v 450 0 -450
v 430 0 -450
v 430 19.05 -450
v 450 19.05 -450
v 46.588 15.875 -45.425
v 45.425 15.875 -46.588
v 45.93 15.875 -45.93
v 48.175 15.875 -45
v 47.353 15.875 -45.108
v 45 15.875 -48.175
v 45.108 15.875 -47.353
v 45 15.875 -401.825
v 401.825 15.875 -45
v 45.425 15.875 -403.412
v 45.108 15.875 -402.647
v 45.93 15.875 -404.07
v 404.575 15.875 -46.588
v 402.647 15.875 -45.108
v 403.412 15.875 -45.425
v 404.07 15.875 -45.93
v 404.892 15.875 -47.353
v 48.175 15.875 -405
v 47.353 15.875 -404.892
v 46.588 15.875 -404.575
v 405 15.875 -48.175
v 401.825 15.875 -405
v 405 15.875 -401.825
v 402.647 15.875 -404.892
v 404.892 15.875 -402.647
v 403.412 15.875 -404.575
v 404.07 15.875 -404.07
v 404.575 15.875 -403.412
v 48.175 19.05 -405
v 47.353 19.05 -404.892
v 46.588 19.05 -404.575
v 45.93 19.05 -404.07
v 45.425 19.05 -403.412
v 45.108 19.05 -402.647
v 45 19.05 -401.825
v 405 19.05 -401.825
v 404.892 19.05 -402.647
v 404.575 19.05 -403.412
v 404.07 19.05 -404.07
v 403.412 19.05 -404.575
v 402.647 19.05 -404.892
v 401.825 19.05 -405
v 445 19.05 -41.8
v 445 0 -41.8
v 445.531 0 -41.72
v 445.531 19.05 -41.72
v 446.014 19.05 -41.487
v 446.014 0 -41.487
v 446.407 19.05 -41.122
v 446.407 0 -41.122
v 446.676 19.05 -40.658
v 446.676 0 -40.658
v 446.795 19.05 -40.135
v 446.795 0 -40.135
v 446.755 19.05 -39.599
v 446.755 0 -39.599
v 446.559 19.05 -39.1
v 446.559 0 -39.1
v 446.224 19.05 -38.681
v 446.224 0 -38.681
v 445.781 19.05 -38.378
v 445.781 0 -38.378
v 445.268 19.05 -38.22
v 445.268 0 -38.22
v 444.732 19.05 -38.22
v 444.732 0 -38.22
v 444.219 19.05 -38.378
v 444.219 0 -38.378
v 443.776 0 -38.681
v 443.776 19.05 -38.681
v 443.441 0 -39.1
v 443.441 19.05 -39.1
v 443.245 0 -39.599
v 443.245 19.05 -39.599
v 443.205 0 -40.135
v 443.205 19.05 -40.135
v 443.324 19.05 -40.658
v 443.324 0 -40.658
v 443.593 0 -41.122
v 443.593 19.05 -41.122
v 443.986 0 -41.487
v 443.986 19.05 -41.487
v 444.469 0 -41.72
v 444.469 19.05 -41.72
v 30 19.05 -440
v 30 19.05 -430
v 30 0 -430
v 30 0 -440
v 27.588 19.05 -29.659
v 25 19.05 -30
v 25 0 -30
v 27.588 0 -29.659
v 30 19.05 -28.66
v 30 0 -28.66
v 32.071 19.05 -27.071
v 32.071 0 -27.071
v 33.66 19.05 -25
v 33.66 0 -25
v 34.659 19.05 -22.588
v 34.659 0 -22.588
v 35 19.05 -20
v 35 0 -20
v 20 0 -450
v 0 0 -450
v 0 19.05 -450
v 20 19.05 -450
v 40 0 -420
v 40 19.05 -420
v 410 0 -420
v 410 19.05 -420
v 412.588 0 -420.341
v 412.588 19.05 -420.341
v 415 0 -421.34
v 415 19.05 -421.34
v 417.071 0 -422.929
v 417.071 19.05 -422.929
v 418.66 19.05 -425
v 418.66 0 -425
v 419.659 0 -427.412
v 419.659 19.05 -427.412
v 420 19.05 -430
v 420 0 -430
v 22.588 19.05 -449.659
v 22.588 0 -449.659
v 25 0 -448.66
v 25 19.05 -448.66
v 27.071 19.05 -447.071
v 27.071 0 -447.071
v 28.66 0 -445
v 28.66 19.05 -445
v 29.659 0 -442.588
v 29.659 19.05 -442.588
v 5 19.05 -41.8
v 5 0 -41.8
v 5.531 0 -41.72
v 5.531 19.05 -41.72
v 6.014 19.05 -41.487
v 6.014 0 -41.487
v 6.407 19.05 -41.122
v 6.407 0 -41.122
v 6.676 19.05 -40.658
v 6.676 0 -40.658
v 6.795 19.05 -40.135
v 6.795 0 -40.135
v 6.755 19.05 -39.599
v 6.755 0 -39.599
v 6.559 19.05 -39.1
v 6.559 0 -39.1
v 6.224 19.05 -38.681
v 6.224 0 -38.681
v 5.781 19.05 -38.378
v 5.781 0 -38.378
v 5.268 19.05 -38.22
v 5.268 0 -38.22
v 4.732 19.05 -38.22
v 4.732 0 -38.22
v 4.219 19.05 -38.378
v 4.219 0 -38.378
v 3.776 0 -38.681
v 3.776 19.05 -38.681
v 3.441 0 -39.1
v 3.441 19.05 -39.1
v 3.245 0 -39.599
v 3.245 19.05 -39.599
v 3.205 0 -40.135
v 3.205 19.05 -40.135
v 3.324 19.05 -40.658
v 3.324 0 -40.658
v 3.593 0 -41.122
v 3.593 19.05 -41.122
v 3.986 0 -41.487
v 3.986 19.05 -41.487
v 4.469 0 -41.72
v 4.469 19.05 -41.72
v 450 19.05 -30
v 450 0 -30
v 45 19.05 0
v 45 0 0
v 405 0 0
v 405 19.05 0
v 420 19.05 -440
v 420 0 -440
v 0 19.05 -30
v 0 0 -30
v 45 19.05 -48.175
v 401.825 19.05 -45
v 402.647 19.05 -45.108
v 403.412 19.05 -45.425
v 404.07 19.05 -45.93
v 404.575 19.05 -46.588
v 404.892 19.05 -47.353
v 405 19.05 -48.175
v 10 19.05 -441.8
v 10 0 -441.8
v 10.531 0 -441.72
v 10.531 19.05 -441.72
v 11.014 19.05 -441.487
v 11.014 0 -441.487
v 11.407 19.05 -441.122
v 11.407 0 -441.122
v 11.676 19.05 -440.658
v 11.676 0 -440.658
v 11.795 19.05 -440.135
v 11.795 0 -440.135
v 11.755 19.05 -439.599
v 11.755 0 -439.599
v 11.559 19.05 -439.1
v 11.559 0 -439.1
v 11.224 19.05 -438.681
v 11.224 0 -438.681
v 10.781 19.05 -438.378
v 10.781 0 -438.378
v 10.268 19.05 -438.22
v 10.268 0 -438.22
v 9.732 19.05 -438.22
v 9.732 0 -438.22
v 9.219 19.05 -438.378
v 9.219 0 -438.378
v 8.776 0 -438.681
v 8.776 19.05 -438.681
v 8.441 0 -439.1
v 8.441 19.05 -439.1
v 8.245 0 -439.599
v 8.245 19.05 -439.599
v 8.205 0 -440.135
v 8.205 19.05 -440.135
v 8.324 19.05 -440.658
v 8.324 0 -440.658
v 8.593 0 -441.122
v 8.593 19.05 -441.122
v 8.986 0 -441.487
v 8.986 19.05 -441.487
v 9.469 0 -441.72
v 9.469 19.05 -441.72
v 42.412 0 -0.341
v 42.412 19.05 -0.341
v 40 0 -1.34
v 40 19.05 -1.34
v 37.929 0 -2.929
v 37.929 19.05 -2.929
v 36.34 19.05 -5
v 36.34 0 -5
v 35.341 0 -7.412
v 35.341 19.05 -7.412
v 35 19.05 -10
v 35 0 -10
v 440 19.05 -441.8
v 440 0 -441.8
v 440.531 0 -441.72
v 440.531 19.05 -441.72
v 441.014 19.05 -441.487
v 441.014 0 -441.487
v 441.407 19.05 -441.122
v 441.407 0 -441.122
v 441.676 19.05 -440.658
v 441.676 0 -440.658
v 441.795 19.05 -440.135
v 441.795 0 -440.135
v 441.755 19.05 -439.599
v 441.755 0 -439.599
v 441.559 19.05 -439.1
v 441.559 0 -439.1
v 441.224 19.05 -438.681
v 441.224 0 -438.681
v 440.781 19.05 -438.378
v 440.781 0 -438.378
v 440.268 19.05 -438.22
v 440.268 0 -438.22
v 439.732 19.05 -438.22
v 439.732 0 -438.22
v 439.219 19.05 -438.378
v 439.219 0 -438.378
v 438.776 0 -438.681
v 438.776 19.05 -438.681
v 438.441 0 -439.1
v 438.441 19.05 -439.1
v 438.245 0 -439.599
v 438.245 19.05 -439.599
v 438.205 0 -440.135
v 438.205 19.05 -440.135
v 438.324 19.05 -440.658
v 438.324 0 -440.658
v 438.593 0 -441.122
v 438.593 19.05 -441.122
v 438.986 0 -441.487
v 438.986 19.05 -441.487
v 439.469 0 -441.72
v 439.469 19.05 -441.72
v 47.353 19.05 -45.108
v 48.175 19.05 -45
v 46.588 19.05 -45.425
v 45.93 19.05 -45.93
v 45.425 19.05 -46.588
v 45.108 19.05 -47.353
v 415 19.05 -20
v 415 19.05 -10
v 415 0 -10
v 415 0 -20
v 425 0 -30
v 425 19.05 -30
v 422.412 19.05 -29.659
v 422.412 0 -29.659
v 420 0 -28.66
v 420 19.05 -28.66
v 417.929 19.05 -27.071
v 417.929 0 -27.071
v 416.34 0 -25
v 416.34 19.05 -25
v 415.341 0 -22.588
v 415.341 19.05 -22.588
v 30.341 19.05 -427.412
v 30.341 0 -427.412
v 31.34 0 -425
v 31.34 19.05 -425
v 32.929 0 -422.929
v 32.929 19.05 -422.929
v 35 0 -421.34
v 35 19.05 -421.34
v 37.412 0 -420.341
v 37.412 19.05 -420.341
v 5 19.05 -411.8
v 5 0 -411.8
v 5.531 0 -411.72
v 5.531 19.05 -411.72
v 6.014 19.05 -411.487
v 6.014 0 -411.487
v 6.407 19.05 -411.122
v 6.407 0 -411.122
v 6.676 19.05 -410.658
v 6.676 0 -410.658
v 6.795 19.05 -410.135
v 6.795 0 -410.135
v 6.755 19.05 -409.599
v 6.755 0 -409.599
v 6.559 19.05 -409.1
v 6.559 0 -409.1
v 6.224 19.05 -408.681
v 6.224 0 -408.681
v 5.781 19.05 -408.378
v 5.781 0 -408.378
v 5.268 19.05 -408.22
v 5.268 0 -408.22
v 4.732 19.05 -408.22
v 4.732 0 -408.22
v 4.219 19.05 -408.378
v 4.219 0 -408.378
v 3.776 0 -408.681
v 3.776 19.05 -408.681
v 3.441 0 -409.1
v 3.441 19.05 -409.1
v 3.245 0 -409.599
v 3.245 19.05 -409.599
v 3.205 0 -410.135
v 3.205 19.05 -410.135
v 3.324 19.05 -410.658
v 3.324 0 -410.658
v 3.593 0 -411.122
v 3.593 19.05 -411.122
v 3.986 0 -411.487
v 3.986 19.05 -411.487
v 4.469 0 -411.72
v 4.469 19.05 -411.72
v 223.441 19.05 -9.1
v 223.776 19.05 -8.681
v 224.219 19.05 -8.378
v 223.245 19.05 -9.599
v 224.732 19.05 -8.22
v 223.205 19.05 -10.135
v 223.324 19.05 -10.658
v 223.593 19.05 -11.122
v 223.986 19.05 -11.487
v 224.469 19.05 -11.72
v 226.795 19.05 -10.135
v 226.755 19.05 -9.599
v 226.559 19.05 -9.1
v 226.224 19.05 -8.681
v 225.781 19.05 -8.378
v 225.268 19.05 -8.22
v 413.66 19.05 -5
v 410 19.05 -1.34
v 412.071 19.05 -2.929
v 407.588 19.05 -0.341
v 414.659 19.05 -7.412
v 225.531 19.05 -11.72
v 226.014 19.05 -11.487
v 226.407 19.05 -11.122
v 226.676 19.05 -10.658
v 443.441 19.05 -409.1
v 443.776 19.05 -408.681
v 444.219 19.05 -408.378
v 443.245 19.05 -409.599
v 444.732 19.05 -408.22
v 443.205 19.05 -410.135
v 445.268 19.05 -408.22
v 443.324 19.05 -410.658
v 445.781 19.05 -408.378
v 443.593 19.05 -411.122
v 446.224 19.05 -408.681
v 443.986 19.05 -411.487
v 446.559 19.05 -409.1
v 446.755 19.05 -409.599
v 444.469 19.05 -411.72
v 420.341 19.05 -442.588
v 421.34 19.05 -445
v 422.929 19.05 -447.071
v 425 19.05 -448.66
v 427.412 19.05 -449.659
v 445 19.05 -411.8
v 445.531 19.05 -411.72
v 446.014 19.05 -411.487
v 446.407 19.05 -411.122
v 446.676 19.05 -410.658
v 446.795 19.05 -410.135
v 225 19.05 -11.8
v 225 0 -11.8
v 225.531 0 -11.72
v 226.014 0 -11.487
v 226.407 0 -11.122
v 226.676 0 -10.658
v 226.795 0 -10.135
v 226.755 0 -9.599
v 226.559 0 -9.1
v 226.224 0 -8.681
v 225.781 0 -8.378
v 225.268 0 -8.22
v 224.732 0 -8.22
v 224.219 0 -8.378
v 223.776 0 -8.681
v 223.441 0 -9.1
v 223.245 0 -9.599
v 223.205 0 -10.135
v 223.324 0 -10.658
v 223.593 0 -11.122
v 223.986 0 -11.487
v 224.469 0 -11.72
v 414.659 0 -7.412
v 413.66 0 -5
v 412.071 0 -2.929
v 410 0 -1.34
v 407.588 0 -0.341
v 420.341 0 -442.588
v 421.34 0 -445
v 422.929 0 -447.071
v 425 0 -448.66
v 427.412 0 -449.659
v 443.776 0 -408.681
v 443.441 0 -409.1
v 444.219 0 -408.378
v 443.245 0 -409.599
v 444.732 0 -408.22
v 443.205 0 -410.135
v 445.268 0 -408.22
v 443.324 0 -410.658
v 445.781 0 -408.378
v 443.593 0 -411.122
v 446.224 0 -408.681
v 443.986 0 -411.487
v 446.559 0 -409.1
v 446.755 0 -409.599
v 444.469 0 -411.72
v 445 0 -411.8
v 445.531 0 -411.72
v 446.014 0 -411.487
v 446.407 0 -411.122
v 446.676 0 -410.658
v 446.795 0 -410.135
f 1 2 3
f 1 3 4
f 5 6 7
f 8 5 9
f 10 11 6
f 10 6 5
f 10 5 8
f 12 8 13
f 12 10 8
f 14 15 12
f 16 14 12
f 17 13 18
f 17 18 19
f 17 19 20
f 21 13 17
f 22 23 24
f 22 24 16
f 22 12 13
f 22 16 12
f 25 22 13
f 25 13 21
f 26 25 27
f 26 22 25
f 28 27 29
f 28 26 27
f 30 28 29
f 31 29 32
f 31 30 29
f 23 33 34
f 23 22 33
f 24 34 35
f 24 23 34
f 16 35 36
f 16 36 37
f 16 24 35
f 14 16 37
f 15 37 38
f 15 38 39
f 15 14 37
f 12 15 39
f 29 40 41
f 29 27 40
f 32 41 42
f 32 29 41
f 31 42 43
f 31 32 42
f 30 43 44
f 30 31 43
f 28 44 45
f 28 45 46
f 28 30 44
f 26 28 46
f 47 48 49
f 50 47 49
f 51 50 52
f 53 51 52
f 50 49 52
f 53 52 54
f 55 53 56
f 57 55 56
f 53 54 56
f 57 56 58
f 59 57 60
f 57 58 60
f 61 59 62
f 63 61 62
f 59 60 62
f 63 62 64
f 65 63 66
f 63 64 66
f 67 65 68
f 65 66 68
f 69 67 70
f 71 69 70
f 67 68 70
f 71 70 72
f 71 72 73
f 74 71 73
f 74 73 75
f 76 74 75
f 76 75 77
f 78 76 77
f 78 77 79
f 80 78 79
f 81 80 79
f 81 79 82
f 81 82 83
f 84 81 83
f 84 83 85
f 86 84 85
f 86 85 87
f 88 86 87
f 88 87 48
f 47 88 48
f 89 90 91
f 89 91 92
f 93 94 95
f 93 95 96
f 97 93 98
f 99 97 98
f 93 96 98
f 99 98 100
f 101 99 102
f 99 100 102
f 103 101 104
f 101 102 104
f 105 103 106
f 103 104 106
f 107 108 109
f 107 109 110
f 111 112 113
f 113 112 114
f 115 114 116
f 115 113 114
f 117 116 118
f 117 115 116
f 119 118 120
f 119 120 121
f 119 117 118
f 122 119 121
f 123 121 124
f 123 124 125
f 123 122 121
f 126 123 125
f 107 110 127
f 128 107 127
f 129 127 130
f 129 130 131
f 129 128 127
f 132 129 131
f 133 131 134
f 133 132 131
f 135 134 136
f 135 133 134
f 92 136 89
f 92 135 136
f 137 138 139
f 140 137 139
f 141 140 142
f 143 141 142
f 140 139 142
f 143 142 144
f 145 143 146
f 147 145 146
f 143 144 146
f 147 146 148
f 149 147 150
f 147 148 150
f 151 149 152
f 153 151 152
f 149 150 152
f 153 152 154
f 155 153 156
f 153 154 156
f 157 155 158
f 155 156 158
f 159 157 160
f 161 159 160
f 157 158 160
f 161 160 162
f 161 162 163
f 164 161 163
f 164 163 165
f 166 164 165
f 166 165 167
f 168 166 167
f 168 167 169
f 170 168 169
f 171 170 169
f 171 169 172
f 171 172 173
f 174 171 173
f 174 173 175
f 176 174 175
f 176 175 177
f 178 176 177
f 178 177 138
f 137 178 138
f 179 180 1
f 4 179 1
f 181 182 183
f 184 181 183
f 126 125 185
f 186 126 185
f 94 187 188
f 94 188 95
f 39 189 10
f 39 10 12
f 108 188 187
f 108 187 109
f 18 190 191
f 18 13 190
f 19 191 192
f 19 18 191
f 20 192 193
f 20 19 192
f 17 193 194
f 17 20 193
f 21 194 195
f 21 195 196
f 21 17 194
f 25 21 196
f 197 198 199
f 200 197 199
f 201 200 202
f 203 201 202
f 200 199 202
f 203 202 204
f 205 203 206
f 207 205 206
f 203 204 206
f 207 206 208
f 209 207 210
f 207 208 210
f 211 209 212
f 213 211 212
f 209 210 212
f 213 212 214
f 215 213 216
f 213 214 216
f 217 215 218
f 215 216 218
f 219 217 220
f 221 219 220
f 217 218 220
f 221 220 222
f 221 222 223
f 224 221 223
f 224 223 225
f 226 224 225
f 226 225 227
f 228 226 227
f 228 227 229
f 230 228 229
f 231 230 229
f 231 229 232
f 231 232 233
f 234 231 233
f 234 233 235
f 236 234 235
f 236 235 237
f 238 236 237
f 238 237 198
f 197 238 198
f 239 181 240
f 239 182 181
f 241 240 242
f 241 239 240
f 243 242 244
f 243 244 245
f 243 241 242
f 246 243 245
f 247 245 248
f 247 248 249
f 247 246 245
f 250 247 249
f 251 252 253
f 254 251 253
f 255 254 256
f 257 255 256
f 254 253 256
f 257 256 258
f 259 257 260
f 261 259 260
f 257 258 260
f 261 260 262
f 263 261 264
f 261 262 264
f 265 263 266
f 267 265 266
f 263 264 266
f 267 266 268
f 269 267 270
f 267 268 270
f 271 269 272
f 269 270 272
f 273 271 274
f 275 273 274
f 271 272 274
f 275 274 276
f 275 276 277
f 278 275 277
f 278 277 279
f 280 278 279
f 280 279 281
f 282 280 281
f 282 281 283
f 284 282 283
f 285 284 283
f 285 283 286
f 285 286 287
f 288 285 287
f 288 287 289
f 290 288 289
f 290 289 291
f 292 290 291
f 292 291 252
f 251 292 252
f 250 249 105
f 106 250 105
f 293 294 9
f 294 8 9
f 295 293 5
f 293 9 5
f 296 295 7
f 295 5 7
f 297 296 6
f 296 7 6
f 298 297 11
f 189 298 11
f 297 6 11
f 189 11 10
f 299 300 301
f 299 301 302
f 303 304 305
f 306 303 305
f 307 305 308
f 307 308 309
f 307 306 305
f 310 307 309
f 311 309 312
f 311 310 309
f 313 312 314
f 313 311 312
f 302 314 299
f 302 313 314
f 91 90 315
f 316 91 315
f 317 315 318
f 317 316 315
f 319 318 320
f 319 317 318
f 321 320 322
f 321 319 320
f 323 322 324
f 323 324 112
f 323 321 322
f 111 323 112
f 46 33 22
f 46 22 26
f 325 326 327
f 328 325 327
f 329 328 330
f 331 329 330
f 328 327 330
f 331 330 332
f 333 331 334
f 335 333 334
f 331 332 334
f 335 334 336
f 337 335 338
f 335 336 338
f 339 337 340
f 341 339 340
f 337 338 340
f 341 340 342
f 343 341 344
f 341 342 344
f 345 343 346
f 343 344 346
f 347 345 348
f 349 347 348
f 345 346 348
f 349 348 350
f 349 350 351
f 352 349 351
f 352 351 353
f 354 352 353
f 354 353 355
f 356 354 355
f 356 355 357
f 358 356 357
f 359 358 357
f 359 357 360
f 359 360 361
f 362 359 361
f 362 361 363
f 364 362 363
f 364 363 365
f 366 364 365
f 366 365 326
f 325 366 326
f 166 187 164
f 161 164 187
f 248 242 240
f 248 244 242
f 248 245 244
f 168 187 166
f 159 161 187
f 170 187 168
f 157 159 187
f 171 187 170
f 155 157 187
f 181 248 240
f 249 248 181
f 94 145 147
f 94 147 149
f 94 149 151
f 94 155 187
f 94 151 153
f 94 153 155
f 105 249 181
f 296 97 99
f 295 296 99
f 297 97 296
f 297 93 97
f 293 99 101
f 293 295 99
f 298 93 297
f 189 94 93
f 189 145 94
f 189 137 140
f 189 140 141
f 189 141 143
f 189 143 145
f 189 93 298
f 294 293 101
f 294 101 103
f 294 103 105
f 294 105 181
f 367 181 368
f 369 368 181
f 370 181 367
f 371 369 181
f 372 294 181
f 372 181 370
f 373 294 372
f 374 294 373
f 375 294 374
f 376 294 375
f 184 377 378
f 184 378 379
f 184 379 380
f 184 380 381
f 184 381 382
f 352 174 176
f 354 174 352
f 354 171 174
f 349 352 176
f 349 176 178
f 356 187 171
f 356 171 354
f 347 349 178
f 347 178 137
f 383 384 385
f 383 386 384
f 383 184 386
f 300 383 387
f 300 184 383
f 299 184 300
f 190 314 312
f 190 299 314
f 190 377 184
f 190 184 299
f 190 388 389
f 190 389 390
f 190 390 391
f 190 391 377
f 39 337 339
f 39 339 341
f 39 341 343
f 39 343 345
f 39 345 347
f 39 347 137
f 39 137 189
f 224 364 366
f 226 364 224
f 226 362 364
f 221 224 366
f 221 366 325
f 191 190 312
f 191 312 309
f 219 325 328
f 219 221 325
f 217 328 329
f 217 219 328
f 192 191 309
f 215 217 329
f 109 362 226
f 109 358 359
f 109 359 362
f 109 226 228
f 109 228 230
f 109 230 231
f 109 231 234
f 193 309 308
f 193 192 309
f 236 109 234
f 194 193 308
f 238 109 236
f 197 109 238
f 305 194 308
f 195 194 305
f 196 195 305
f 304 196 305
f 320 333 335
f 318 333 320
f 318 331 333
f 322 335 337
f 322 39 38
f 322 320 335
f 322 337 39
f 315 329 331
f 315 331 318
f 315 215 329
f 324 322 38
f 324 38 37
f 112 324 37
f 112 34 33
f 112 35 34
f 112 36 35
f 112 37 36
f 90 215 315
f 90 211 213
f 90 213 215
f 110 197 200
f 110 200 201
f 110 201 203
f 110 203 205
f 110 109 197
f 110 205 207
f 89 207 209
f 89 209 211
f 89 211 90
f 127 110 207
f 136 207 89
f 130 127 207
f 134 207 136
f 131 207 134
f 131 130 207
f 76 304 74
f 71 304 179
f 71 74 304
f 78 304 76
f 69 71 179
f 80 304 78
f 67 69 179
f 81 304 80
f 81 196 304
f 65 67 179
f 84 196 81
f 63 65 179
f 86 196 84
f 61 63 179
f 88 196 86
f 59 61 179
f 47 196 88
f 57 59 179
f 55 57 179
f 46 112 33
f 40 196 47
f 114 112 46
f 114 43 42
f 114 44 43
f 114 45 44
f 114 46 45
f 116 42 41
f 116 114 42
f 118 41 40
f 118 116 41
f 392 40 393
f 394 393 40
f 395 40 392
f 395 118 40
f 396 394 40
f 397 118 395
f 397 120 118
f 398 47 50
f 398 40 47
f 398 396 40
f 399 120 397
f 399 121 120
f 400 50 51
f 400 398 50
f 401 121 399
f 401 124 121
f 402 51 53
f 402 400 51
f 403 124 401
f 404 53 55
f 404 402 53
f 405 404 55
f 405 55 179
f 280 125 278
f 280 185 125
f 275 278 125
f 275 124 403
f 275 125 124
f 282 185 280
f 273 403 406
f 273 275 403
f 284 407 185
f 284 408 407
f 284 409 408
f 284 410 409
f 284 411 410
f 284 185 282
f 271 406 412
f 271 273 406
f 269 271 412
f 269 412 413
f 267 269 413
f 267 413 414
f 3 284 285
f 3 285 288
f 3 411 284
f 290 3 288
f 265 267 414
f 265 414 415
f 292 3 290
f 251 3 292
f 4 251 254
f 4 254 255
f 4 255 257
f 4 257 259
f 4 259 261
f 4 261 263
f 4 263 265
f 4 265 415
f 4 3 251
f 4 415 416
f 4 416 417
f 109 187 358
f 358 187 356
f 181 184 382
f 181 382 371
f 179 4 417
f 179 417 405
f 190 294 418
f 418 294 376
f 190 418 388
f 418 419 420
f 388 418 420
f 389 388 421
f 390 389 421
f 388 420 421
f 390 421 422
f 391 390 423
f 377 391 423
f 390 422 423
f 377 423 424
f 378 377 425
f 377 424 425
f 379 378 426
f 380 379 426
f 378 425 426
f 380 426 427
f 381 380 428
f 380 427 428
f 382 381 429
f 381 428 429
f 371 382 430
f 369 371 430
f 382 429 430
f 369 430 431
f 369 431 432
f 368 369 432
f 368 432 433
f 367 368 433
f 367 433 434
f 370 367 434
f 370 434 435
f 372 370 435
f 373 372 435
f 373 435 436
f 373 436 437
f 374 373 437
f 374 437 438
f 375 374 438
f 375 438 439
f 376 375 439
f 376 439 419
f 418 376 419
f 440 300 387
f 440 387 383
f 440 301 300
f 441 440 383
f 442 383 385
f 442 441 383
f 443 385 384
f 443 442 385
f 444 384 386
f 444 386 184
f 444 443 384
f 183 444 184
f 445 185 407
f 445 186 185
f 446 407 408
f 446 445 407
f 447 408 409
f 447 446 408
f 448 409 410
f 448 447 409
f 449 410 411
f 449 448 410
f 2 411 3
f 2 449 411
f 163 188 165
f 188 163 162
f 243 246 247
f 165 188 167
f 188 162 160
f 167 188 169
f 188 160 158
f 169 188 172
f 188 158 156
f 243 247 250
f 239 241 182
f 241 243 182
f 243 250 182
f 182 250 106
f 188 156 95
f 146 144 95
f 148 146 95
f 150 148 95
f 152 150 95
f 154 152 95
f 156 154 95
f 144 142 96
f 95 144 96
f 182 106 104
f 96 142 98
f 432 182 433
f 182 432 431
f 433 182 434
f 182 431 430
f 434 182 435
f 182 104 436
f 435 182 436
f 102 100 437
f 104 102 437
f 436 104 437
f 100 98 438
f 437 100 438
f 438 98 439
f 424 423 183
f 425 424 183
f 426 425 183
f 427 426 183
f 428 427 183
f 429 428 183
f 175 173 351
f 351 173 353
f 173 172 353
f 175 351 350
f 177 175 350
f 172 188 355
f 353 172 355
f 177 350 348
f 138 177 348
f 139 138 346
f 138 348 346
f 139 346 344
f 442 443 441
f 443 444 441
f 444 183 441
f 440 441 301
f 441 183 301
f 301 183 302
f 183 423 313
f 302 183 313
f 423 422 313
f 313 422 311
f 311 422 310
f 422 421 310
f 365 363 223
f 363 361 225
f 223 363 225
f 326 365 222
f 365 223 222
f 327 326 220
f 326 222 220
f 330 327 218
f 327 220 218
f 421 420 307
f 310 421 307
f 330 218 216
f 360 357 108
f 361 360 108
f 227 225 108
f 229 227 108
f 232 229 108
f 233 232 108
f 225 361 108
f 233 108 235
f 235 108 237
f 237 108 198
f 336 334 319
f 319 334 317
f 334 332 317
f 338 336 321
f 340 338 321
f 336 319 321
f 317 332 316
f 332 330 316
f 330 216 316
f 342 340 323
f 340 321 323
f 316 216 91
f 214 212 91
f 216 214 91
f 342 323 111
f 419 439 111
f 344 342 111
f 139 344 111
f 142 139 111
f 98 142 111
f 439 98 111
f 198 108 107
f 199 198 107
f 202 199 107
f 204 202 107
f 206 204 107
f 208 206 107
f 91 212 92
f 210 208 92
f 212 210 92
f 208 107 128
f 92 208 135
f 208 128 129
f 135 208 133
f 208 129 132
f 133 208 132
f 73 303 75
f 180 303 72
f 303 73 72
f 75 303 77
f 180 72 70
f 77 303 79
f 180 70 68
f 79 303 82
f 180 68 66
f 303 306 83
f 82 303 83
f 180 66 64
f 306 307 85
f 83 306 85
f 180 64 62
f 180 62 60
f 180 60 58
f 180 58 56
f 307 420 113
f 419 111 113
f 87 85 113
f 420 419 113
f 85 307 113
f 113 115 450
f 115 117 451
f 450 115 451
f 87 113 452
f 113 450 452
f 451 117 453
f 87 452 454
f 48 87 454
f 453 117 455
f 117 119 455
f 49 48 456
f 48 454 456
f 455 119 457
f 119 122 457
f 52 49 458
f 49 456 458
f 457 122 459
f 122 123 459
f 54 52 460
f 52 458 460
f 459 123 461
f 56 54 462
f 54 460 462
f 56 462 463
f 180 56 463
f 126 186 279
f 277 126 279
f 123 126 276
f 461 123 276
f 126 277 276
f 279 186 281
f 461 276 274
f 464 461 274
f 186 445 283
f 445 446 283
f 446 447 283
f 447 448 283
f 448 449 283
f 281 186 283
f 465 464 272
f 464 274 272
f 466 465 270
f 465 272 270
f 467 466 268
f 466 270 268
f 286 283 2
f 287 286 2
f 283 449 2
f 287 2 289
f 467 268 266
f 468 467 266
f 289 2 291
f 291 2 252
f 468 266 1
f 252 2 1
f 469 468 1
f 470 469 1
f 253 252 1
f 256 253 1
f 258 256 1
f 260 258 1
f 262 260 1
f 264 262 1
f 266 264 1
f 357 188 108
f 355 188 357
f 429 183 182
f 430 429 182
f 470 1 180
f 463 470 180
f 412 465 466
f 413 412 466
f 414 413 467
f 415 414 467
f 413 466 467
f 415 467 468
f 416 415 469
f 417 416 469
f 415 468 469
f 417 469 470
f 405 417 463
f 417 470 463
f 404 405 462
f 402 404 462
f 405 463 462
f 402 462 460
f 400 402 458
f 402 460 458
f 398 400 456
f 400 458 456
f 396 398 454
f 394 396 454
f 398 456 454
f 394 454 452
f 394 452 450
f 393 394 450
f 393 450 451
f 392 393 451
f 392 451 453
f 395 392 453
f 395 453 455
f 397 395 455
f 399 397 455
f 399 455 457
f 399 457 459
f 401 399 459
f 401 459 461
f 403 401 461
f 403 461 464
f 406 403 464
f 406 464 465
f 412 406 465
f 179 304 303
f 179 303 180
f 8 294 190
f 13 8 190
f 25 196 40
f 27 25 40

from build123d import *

# Parameters (mm, degrees)
SKETCH2_W            = 450
SKETCH2_H            = 450
BOSS_EXTRUDE1_DEPTH  = 19.05
SKETCH7_W            = 35
SKETCH7_H            = 30
SKETCH7_W_2          = 390
CUT_EXTRUDE2_DEPTH   = 637.681162357
FILLET2_R            = 10
SKETCH3_W            = 360
SKETCH3_H            = 360
CUT_EXTRUDE1_DEPTH   = 3.175
FILLET1_R            = 3.175
M3_CLEARANCE_HOLE1_D = 3.6
M3_CLEARANCE_HOLE2_D = 3.6


with BuildPart() as part:
    # Sketch2 → Boss-Extrude1 (new body)
    with BuildSketch(Plane(origin=(0, 0, 0), x_dir=(1, 0, 0), z_dir=(0, 1, 0))):
        with Locations((225, 225)):
            Rectangle(SKETCH2_W, SKETCH2_H)
    extrude(amount=BOSS_EXTRUDE1_DEPTH)

    # Sketch7 → Cut-Extrude2 (cut, through all)
    with BuildSketch(Plane(origin=(0, 19.05, 0), x_dir=(1, 0, 0), z_dir=(0, 1, 0))):
        with Locations((432.5, 15)):
            Rectangle(SKETCH7_W, SKETCH7_H)
        with Locations((17.5, 15)):
            Rectangle(SKETCH7_W, SKETCH7_H)
        with Locations((225, 435)):
            Rectangle(SKETCH7_W_2, SKETCH7_H)
    extrude(amount=-CUT_EXTRUDE2_DEPTH, mode=Mode.SUBTRACT)

    # Fillet2
    fillet2_edges = [part.edges().sort_by_distance(p)[0] for p in [
        (35, 9.525, -30),
        (35, 9.525, 0),
        (30, 9.525, -420),
        (30, 9.525, -450),
        (420, 9.525, -450),
        (420, 9.525, -420),
        (415, 9.525, 0),
        (415, 9.525, -30),
    ]]
    fillet(fillet2_edges, radius=FILLET2_R)

    # Sketch3 → Cut-Extrude1 (cut)
    with BuildSketch(Plane(origin=(0, 19.05, 0), x_dir=(1, 0, 0), z_dir=(0, 1, 0))):
        with Locations((225, 225)):
            Rectangle(SKETCH3_W, SKETCH3_H)
    extrude(amount=-CUT_EXTRUDE1_DEPTH, mode=Mode.SUBTRACT)

    # Fillet1
    fillet1_edges = [part.edges().sort_by_distance(p)[0] for p in [
        (45, 17.4625, -405),
        (405, 17.4625, -405),
        (405, 17.4625, -45),
        (45, 17.4625, -45),
    ]]
    fillet(fillet1_edges, radius=FILLET1_R)

    # M3 Clearance Hole1 (through all)
    with Locations(Plane(origin=(440, 19.05, -440), x_dir=(0, 0, 1), z_dir=(0, 1, 0))):
        with Locations((0, 0), (0, -430), (430, -215)):
            Hole(M3_CLEARANCE_HOLE1_D / 2)

    # M3 Clearance Hole2 (through all)
    with Locations(Plane(origin=(445, 19.05, -410), x_dir=(0, 0, 1), z_dir=(0, 1, 0))):
        with Locations((0, 0), (0, -440), (370, -440), (370, 0)):
            Hole(M3_CLEARANCE_HOLE2_D / 2)


solid = part.part
